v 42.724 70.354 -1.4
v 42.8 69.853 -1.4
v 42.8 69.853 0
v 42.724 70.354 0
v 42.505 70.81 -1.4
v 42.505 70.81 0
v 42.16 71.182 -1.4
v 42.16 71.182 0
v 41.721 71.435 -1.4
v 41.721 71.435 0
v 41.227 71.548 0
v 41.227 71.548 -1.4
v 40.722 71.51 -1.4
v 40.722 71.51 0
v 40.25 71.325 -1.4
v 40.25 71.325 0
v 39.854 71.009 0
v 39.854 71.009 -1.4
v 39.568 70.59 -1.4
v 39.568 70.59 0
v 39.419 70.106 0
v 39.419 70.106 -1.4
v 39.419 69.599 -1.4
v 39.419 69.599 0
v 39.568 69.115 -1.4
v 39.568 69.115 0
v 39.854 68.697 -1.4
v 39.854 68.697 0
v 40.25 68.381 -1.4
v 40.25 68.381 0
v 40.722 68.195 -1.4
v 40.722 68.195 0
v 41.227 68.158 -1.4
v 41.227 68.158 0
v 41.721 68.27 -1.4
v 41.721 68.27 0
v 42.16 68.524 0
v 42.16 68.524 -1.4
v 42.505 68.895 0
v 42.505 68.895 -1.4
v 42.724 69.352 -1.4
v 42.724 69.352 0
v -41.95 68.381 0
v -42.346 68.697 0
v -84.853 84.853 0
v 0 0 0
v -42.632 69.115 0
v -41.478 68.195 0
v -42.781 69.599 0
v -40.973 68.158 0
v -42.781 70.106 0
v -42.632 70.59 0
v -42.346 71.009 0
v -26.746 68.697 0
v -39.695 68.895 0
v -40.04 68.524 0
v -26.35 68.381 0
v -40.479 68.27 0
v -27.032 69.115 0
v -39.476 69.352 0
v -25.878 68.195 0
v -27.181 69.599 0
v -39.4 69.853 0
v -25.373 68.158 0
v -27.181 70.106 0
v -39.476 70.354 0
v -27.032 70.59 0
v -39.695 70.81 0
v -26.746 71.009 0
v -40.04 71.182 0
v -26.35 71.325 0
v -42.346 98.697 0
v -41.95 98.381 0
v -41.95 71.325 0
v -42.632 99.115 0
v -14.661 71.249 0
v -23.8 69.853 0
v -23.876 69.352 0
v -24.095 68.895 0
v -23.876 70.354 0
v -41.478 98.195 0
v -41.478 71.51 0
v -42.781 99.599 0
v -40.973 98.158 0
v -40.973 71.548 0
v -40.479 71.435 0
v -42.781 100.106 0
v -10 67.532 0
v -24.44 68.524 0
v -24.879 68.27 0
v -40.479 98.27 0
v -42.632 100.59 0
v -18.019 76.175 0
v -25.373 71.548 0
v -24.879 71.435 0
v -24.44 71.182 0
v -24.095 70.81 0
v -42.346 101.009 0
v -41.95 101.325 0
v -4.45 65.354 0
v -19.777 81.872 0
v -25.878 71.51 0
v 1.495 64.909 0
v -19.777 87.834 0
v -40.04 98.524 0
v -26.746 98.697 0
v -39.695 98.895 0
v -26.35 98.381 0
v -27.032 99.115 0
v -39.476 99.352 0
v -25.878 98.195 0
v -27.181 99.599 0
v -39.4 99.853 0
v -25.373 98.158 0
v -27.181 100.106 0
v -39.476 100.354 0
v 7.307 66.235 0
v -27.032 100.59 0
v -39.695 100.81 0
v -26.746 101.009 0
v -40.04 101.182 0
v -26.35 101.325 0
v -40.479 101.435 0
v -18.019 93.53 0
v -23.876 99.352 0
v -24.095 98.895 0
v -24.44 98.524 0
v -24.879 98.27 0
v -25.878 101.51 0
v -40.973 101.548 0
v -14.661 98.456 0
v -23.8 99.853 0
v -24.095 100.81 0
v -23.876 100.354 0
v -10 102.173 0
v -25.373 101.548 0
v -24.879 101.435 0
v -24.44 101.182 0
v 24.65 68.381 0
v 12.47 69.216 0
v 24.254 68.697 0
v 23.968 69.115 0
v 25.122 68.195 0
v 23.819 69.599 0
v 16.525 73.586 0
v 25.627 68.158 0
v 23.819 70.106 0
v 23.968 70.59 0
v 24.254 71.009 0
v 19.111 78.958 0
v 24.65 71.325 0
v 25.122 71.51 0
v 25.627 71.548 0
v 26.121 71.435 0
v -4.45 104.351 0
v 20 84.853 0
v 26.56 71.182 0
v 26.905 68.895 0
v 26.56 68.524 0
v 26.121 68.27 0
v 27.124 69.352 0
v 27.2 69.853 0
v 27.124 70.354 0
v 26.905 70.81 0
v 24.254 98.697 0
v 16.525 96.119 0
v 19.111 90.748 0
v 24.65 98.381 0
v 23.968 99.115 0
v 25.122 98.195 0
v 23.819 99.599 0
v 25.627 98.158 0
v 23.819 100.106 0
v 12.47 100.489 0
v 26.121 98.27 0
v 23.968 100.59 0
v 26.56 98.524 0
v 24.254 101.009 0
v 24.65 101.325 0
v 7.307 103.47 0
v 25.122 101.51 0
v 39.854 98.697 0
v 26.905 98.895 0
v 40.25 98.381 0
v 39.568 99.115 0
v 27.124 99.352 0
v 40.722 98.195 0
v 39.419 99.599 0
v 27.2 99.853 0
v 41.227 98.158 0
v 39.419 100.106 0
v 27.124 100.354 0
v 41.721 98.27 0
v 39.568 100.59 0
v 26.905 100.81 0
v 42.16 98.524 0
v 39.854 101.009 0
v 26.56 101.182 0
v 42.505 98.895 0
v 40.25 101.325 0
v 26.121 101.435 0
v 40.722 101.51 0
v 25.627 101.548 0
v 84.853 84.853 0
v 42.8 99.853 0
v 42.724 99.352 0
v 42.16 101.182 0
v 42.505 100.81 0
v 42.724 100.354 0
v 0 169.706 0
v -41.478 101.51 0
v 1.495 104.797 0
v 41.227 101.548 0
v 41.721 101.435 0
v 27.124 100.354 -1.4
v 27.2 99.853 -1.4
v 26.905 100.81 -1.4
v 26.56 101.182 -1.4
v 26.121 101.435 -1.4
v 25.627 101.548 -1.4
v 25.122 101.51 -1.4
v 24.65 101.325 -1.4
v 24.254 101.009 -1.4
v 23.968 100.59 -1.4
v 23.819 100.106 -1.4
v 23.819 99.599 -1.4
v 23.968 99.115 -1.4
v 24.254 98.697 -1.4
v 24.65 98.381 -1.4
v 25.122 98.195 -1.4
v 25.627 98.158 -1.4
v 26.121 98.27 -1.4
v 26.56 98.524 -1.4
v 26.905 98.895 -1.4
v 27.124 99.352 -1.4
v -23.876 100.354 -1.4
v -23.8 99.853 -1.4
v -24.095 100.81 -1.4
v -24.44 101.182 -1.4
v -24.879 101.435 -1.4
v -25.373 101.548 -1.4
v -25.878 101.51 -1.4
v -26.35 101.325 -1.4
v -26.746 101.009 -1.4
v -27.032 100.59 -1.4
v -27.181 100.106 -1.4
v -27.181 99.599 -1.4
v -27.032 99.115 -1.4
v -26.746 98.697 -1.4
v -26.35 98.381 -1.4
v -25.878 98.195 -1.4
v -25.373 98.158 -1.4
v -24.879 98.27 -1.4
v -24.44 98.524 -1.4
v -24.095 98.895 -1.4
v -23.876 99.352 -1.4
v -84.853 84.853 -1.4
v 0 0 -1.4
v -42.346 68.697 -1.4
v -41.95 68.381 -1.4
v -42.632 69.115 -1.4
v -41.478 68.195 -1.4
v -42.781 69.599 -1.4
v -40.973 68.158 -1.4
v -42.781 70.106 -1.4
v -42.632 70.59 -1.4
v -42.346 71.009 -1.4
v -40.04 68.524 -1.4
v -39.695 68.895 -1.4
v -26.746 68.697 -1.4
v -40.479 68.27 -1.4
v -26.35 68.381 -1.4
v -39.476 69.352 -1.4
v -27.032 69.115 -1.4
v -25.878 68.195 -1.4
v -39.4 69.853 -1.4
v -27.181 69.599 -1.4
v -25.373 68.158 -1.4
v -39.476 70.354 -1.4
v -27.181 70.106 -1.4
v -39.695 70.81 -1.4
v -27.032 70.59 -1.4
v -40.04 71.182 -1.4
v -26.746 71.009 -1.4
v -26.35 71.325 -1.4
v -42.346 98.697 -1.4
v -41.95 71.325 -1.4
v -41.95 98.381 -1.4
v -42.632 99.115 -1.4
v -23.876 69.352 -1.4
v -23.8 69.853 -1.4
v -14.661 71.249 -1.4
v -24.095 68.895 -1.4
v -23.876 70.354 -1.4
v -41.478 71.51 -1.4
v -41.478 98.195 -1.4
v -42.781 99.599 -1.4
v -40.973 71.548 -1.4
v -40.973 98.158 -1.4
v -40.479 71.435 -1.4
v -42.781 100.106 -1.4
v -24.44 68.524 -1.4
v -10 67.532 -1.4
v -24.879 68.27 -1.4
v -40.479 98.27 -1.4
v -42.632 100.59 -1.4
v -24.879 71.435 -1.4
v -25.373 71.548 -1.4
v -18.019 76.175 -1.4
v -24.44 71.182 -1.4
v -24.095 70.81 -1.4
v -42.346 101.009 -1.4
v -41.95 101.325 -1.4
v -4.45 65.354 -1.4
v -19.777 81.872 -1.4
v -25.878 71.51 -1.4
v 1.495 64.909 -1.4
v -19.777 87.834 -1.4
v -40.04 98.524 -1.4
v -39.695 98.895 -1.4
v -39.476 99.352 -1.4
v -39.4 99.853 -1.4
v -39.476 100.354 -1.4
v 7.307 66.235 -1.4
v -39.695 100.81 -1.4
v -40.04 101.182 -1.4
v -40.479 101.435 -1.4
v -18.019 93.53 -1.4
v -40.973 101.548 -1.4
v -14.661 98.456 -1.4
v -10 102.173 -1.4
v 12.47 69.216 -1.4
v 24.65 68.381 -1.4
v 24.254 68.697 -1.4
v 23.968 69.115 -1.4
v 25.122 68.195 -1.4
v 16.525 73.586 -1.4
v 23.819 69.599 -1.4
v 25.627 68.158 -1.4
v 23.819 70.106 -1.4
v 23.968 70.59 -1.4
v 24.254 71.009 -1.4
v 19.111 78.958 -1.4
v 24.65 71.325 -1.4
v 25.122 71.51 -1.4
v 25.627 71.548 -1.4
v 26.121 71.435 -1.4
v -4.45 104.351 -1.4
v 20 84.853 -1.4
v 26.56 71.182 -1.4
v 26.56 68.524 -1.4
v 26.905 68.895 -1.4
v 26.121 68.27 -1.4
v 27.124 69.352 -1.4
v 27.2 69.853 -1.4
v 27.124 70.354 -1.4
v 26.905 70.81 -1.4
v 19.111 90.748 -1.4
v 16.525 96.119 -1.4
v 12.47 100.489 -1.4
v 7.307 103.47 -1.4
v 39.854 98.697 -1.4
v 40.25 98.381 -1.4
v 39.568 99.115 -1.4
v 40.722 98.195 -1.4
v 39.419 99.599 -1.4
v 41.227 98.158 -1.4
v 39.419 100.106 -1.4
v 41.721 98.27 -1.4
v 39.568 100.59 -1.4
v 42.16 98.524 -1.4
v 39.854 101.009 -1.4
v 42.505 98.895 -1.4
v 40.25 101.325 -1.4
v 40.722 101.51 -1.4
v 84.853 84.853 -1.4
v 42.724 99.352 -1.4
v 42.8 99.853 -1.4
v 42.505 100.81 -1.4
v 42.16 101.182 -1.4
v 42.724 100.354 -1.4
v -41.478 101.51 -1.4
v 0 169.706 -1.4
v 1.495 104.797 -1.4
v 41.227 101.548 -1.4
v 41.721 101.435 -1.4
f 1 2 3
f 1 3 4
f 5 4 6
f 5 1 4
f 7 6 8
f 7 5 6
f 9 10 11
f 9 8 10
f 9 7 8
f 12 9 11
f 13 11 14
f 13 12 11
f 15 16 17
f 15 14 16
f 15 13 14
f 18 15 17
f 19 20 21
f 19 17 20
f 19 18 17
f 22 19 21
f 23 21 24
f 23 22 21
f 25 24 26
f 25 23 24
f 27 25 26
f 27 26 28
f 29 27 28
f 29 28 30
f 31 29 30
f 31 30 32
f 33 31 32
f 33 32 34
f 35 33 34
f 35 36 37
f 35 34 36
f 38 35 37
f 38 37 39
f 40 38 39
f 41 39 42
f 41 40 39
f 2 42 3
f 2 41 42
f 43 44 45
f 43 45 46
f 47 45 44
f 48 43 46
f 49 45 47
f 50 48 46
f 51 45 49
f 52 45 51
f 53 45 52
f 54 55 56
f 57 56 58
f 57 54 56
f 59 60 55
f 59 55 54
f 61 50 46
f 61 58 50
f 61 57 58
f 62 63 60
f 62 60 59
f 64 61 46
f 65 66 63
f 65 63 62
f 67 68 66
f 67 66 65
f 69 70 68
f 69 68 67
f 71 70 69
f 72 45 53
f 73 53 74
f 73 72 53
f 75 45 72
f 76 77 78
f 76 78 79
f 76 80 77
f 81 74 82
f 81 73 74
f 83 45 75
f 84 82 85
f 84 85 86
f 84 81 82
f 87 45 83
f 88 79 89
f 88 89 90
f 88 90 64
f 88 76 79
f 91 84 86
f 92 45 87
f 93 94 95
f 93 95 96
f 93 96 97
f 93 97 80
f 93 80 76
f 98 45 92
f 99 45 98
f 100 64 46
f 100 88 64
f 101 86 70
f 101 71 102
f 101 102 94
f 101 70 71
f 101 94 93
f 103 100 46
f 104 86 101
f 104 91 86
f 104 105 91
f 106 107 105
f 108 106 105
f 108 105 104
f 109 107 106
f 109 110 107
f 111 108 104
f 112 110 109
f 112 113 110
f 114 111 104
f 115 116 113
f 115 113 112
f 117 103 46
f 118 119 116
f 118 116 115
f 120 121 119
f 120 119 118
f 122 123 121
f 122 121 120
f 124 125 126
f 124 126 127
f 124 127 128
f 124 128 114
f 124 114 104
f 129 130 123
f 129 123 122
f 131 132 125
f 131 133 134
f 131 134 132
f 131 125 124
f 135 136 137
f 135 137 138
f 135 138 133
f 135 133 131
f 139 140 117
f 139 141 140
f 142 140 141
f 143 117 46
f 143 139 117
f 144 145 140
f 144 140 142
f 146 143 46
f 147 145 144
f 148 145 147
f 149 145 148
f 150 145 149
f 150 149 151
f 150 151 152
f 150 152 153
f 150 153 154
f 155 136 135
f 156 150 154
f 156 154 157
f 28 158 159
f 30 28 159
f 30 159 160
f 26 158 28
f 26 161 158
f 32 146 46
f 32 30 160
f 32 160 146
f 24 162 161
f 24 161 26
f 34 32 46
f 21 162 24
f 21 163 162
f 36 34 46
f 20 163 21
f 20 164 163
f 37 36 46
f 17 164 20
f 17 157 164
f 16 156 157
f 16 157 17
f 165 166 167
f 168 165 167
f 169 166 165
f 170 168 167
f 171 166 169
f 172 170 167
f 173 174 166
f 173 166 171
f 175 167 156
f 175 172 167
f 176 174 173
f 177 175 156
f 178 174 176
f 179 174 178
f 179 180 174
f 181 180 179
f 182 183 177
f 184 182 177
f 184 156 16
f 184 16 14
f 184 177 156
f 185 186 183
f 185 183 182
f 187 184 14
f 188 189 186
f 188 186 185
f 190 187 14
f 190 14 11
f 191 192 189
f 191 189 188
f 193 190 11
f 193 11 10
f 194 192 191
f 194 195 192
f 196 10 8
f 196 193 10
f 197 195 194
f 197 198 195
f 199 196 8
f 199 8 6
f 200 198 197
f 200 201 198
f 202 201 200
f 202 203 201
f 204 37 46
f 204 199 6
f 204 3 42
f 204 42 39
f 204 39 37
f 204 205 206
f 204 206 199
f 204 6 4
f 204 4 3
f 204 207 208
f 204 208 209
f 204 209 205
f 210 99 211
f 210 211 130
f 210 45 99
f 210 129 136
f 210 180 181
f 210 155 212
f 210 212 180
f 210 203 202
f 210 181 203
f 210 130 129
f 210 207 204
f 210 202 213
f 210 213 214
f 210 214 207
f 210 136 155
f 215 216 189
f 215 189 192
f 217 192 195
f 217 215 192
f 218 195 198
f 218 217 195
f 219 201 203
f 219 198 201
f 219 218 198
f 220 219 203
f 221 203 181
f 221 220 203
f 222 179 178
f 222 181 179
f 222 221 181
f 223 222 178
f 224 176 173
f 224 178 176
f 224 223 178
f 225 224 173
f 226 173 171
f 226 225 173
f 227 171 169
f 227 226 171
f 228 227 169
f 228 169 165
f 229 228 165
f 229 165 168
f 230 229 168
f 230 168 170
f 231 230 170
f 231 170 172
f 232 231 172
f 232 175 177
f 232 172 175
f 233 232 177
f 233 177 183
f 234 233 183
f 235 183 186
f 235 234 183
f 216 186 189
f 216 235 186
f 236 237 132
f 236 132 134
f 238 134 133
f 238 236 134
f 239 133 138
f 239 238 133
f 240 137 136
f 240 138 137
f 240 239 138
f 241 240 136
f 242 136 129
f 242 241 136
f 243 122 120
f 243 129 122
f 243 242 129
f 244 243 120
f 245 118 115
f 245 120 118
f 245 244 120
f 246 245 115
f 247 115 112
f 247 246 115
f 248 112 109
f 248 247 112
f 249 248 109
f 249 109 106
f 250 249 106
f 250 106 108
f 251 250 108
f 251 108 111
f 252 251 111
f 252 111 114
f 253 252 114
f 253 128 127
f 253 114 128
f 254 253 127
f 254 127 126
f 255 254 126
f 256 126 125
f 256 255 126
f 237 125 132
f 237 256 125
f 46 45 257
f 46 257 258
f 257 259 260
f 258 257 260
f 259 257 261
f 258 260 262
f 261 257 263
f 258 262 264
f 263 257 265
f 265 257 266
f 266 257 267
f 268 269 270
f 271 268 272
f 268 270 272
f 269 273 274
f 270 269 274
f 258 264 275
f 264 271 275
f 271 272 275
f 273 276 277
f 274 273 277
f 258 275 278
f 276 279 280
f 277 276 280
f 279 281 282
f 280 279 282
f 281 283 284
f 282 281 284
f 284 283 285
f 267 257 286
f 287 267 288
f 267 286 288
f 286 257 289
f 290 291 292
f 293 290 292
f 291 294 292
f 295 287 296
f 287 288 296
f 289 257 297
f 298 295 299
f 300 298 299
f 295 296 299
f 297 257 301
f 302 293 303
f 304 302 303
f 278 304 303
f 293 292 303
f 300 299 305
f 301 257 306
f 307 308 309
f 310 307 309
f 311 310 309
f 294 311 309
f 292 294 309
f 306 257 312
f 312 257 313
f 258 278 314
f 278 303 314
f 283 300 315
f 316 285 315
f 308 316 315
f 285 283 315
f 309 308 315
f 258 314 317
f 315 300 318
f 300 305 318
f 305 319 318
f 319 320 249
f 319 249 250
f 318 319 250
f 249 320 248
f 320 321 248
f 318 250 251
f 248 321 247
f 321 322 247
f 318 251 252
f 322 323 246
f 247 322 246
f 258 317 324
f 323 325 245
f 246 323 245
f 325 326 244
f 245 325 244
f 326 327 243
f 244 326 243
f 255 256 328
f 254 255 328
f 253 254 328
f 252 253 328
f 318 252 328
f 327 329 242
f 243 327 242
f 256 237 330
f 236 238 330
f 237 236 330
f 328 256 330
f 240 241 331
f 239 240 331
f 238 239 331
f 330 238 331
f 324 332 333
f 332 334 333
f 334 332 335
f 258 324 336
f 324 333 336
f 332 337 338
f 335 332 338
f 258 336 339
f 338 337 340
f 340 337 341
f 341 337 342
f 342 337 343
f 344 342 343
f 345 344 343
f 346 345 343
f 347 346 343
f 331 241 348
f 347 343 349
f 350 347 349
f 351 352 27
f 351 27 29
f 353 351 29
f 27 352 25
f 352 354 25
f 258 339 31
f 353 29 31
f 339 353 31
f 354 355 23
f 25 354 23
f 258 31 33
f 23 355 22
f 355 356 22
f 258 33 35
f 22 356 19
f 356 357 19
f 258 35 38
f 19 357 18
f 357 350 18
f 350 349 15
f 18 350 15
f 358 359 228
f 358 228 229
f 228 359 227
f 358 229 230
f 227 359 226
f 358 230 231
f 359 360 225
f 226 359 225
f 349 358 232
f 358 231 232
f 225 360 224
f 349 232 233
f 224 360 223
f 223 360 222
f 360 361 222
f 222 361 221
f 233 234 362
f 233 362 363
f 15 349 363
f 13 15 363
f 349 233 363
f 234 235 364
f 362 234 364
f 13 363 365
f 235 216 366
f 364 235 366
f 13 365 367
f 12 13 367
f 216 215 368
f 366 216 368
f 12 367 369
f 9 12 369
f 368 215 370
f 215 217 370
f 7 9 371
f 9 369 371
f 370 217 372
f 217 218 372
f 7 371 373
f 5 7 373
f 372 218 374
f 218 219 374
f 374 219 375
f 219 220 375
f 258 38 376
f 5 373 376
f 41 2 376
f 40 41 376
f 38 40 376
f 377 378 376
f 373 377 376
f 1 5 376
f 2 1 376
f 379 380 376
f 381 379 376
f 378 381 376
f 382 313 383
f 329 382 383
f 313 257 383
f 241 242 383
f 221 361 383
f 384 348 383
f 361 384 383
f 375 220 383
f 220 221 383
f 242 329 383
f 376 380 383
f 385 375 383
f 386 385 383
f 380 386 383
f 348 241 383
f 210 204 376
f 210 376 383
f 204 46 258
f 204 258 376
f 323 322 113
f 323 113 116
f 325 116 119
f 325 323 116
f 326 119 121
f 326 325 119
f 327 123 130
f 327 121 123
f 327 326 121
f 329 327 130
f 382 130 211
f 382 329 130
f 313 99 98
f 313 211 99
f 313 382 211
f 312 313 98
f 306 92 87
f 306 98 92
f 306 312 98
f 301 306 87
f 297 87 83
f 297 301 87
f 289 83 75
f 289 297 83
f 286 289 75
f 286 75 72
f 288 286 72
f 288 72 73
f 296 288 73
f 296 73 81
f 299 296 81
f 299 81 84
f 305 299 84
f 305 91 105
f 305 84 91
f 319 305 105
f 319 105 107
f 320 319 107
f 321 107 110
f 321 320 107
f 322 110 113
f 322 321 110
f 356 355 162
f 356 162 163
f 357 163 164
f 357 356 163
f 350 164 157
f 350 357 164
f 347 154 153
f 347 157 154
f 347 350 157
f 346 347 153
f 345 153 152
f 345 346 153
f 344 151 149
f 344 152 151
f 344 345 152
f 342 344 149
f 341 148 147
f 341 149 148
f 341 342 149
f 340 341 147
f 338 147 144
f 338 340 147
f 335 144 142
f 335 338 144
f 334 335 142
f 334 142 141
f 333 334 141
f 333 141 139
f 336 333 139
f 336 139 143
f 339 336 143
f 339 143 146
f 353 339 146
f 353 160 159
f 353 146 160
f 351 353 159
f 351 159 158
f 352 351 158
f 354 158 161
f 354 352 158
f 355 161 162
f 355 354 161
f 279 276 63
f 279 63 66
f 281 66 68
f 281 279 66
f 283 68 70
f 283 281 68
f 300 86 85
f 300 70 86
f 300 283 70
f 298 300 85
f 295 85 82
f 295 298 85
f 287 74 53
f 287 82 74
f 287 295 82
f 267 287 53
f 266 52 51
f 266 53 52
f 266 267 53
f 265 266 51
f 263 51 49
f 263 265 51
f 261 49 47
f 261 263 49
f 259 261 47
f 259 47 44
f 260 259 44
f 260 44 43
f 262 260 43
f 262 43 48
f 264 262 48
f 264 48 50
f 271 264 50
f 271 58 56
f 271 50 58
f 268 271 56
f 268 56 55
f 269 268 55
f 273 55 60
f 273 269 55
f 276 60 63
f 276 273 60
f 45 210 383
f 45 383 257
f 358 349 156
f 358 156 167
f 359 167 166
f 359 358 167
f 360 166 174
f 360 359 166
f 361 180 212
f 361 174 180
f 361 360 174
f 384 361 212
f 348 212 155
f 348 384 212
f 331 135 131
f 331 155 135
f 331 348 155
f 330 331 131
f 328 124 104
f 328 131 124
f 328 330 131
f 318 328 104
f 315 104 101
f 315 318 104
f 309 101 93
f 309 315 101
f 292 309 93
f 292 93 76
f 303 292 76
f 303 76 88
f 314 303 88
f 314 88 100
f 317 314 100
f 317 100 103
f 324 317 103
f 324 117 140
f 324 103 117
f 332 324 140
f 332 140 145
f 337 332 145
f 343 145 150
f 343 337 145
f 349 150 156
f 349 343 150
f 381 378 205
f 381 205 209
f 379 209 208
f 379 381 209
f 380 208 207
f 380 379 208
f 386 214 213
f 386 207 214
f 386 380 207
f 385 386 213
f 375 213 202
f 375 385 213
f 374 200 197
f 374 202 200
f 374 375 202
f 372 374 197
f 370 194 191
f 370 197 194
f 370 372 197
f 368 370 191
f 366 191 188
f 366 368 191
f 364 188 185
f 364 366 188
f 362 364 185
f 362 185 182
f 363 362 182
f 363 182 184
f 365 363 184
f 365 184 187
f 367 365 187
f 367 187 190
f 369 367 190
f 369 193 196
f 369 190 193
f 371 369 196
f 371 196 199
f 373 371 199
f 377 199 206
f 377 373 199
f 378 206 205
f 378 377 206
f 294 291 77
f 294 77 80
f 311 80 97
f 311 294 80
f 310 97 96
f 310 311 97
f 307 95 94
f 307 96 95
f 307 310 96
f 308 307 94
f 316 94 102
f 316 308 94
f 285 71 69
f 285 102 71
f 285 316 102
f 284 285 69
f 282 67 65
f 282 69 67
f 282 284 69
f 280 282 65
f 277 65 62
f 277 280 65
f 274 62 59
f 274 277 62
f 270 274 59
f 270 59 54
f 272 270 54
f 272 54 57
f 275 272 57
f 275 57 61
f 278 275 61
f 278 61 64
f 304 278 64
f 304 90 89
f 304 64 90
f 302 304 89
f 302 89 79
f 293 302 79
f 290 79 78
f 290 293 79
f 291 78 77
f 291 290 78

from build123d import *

# Parameters (mm, degrees)
BASE_FLANGE1_DEPTH      = 1.4
CUT_EXTRUDE1_DEPTH      = 190.741824593
CUT_EXTRUDE1_DEPTH_BACK = 190.741824593
MOTOR_HOLE_R            = 20
CUT_EXTRUDE2_DEPTH      = 190.741824593
CUT_EXTRUDE2_DEPTH_BACK = 190.741824593
SKETCH9_R               = 1.7


# Sheet-metal steps are written as plain solids
with BuildPart() as part:
    # Sketch1 → Base-Flange1 (new body)
    with BuildSketch(Plane.XY):
        Polygon((0, 0), (84.852813742, 84.852813742), (0, 169.705627485), (-84.852813742, 84.852813742), align=None)
    extrude(amount=-BASE_FLANGE1_DEPTH)

    # Motor hole → Cut-Extrude1 (cut, two sides: drawn at the far end of the back side and taken through both)
    with BuildSketch(Plane.XY.offset(-CUT_EXTRUDE1_DEPTH_BACK)):
        with Locations((0, 84.852813742)):
            Circle(MOTOR_HOLE_R)
    extrude(amount=CUT_EXTRUDE1_DEPTH + CUT_EXTRUDE1_DEPTH_BACK, mode=Mode.SUBTRACT)

    # Sketch9 → Cut-Extrude2 (cut, two sides: drawn at the far end of the back side and taken through both)
    with BuildSketch(Plane.XY.offset(-CUT_EXTRUDE2_DEPTH_BACK)):
        with Locations((-41.1, 99.852813742)):
            Circle(SKETCH9_R)
        with Locations((-25.5, 99.852813742)):
            Circle(SKETCH9_R)
        with Locations((-41.1, 69.852813742)):
            Circle(SKETCH9_R)
        with Locations((-25.5, 69.852813742)):
            Circle(SKETCH9_R)
        with Locations((25.5, 99.852813742)):
            Circle(SKETCH9_R)
        with Locations((41.1, 99.852813742)):
            Circle(SKETCH9_R)
        with Locations((25.5, 69.852813742)):
            Circle(SKETCH9_R)
        with Locations((41.1, 69.852813742)):
            Circle(SKETCH9_R)
    extrude(amount=CUT_EXTRUDE2_DEPTH + CUT_EXTRUDE2_DEPTH_BACK, mode=Mode.SUBTRACT)


solid = part.part
